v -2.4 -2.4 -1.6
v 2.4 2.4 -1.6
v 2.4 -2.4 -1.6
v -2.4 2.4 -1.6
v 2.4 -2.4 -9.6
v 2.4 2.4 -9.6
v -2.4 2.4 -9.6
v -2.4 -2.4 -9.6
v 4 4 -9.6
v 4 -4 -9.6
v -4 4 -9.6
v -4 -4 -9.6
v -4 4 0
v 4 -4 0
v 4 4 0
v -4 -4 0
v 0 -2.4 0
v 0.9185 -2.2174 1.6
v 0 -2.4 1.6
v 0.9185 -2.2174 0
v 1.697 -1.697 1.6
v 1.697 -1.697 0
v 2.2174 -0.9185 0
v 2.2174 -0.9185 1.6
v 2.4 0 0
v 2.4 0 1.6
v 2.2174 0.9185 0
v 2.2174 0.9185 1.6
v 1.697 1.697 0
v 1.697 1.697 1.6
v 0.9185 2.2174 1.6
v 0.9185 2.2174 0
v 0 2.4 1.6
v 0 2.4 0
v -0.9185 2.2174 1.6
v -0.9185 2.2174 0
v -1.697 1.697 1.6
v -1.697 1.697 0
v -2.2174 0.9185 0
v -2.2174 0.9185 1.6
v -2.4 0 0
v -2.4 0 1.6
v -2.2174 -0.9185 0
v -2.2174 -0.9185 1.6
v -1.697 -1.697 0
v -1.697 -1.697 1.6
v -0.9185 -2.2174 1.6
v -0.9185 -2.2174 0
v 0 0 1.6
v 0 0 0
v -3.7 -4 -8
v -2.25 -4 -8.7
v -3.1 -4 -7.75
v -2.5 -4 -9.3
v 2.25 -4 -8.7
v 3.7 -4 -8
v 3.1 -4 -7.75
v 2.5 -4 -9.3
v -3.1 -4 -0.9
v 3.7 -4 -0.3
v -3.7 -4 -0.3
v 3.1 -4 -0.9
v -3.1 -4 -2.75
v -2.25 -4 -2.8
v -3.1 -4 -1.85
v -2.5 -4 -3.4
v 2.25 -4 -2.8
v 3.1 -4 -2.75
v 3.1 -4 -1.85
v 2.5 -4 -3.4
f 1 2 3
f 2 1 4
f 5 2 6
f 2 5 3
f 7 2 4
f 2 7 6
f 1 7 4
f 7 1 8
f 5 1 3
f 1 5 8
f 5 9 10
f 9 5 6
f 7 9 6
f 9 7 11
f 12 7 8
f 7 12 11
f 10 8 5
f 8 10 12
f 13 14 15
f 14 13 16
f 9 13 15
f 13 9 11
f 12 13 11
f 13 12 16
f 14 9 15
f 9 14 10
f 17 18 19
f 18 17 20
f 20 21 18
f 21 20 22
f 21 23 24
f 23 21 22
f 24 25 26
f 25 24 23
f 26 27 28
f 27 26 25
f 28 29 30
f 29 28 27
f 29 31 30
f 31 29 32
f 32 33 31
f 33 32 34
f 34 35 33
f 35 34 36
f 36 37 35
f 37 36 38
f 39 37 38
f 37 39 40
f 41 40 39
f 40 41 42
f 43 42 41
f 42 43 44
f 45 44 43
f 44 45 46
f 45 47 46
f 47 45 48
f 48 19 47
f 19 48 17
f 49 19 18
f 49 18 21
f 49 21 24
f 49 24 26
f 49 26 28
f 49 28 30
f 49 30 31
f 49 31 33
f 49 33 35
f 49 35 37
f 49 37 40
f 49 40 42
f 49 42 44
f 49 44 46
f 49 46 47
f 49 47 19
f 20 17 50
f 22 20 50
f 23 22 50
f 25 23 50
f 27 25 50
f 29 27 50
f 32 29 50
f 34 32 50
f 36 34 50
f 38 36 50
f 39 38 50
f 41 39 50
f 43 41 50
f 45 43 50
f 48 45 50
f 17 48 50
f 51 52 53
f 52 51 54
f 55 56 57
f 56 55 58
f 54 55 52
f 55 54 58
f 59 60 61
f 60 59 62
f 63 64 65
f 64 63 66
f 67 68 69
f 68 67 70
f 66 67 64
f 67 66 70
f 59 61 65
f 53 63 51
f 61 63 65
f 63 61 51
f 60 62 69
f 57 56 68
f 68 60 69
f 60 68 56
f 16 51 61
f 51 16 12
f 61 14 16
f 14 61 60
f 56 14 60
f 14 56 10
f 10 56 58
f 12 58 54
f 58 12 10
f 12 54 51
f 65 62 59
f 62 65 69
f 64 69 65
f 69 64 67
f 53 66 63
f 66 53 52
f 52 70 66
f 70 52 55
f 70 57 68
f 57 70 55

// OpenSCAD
// file: ../p/4-4edge.scad
use <../lib.scad>
function ldraw_lib__4_4edge() = [
// 0 Circle 1.0
// 0 Name: 4-4edge.dat
// 0 Author: James Jessiman
// 0 !LDRAW_ORG Primitive UPDATE 2017-01
// 0 !LICENSE Licensed under CC BY 2.0 and CC BY 4.0 : see CAreadme.txt
// 
// 0 BFC CERTIFY CCW
  [0,"BFC","CERTIFY"],
  [0,"BFC","CCW"],
// 
// 0 !HISTORY 1998-12-15 [PTadmin] Official Update 1998-10
// 0 !HISTORY 2005-12-28 [PTadmin] Official Update 2005-01
// 0 !HISTORY 2007-06-24 [PTadmin] Header formatted for Contributor Agreement
// 0 !HISTORY 2008-07-01 [PTadmin] Official Update 2008-01
// 0 !HISTORY 2017-01-15 [Steffen] BFCed
// 0 !HISTORY 2017-12-30 [PTadmin] Official Update 2017-01
// 
// 
// 2 24 1 0 0 0.9239 0 0.3827
  [2,24,1,0,0,0.9239,0,0.3827],
// 2 24 0.9239 0 0.3827 0.7071 0 0.7071
  [2,24,0.9239,0,0.3827,0.7071,0,0.7071],
// 2 24 0.7071 0 0.7071 0.3827 0 0.9239
  [2,24,0.7071,0,0.7071,0.3827,0,0.9239],
// 2 24 0.3827 0 0.9239 0 0 1
  [2,24,0.3827,0,0.9239,0,0,1],
// 2 24 0 0 1 -0.3827 0 0.9239
  [2,24,0,0,1,-0.3827,0,0.9239],
// 2 24 -0.3827 0 0.9239 -0.7071 0 0.7071
  [2,24,-0.3827,0,0.9239,-0.7071,0,0.7071],
// 2 24 -0.7071 0 0.7071 -0.9239 0 0.3827
  [2,24,-0.7071,0,0.7071,-0.9239,0,0.3827],
// 2 24 -0.9239 0 0.3827 -1 0 -0
  [2,24,-0.9239,0,0.3827,-1,0,-0],
// 2 24 -1 0 -0 -0.9239 0 -0.3827
  [2,24,-1,0,-0,-0.9239,0,-0.3827],
// 2 24 -0.9239 0 -0.3827 -0.7071 0 -0.7071
  [2,24,-0.9239,0,-0.3827,-0.7071,0,-0.7071],
// 2 24 -0.7071 0 -0.7071 -0.3827 0 -0.9239
  [2,24,-0.7071,0,-0.7071,-0.3827,0,-0.9239],
// 2 24 -0.3827 0 -0.9239 0 0 -1
  [2,24,-0.3827,0,-0.9239,0,0,-1],
// 2 24 0 0 -1 0.3827 0 -0.9239
  [2,24,0,0,-1,0.3827,0,-0.9239],
// 2 24 0.3827 0 -0.9239 0.7071 0 -0.7071
  [2,24,0.3827,0,-0.9239,0.7071,0,-0.7071],
// 2 24 0.7071 0 -0.7071 0.9239 0 -0.3827
  [2,24,0.7071,0,-0.7071,0.9239,0,-0.3827],
// 2 24 0.9239 0 -0.3827 1 0 0
  [2,24,0.9239,0,-0.3827,1,0,0],
];
module ldraw_lib__4_4edge(step=0, col=false, unit=2/5, alt=false, line=0.2, solid=!$preview)
    makepoly(ldraw_lib__4_4edge(), step=step, col=col, unit=unit, alt=alt, line=line, solid=solid);
ldraw_lib__4_4edge(line=0.2);
// file: ../p/4-4disc.scad
use <../lib.scad>
function ldraw_lib__4_4disc() = [
// 0 Disc 1.0
// 0 Name: 4-4disc.dat
// 0 Author: James Jessiman
// 0 !LDRAW_ORG Primitive UPDATE 2002-02
// 0 !LICENSE Licensed under CC BY 2.0 and CC BY 4.0 : see CAreadme.txt
// 
// 0 BFC CERTIFY CCW
  [0,"BFC","CERTIFY"],
  [0,"BFC","CCW"],
// 
// 0 !HISTORY 1998-12-15 [PTadmin] Official Update 1998-10
// 0 !HISTORY 2002-03-23 [sbliss] Added BFC statement
// 0 !HISTORY 2002-04-25 [PTadmin] Official Update 2002-02
// 0 !HISTORY 2007-06-24 [PTadmin] Header formatted for Contributor Agreement
// 0 !HISTORY 2008-07-01 [PTadmin] Official Update 2008-01
// 
// 
// 3 16 0 0 0 1 0 0 0.9239 0 0.3827
  [3,16,0,0,0,1,0,0,0.9239,0,0.3827],
// 3 16 0 0 0 0.9239 0 0.3827 0.7071 0 0.7071
  [3,16,0,0,0,0.9239,0,0.3827,0.7071,0,0.7071],
// 3 16 0 0 0 0.7071 0 0.7071 0.3827 0 0.9239
  [3,16,0,0,0,0.7071,0,0.7071,0.3827,0,0.9239],
// 3 16 0 0 0 0.3827 0 0.9239 0 0 1
  [3,16,0,0,0,0.3827,0,0.9239,0,0,1],
// 3 16 0 0 0 0 0 1 -0.3827 0 0.9239
  [3,16,0,0,0,0,0,1,-0.3827,0,0.9239],
// 3 16 0 0 0 -0.3827 0 0.9239 -0.7071 0 0.7071
  [3,16,0,0,0,-0.3827,0,0.9239,-0.7071,0,0.7071],
// 3 16 0 0 0 -0.7071 0 0.7071 -0.9239 0 0.3827
  [3,16,0,0,0,-0.7071,0,0.7071,-0.9239,0,0.3827],
// 3 16 0 0 0 -0.9239 0 0.3827 -1 0 -0
  [3,16,0,0,0,-0.9239,0,0.3827,-1,0,-0],
// 3 16 0 0 0 -1 0 -0 -0.9239 0 -0.3827
  [3,16,0,0,0,-1,0,-0,-0.9239,0,-0.3827],
// 3 16 0 0 0 -0.9239 0 -0.3827 -0.7071 0 -0.7071
  [3,16,0,0,0,-0.9239,0,-0.3827,-0.7071,0,-0.7071],
// 3 16 0 0 0 -0.7071 0 -0.7071 -0.3827 0 -0.9239
  [3,16,0,0,0,-0.7071,0,-0.7071,-0.3827,0,-0.9239],
// 3 16 0 0 0 -0.3827 0 -0.9239 0 0 -1
  [3,16,0,0,0,-0.3827,0,-0.9239,0,0,-1],
// 3 16 0 0 0 0 0 -1 0.3827 0 -0.9239
  [3,16,0,0,0,0,0,-1,0.3827,0,-0.9239],
// 3 16 0 0 0 0.3827 0 -0.9239 0.7071 0 -0.7071
  [3,16,0,0,0,0.3827,0,-0.9239,0.7071,0,-0.7071],
// 3 16 0 0 0 0.7071 0 -0.7071 0.9239 0 -0.3827
  [3,16,0,0,0,0.7071,0,-0.7071,0.9239,0,-0.3827],
// 3 16 0 0 0 0.9239 0 -0.3827 1 0 0
  [3,16,0,0,0,0.9239,0,-0.3827,1,0,0],
// 0
];
module ldraw_lib__4_4disc(step=0, col=false, unit=2/5, alt=false, line=0.2, solid=!$preview)
    makepoly(ldraw_lib__4_4disc(), step=step, col=col, unit=unit, alt=alt, line=line, solid=solid);
ldraw_lib__4_4disc(line=0.2);
// file: ../p/4-4cyli.scad
use <../lib.scad>
$fa=1; $fs=0.2;
function ldraw_lib__4_4cyli(realsolid=false) = [
// 0 Cylinder 1.0
// 0 Name: 4-4cyli.dat
// 0 Author: James Jessiman
// 0 !LDRAW_ORG Primitive UPDATE 2005-01
// 0 !LICENSE Licensed under CC BY 2.0 and CC BY 4.0 : see CAreadme.txt
// 
// 0 BFC CERTIFY CCW
  [0,"BFC","CERTIFY"],
  [0,"BFC","CCW"],
// 
// 0 !HISTORY 1998-12-15 [PTadmin] Official Update 1998-10
// 0 !HISTORY 2002-03-23 [sbliss] Added BFC statement; merged headers from files in distributions LDraw 0.27 and Complete.
// 0 !HISTORY 2002-04-25 [PTadmin] Official Update 2002-02
// 0 !HISTORY 2004-12-14 [guyvivan] BFC CCW
// 0 !HISTORY 2005-12-28 [PTadmin] Official Update 2005-01
// 0 !HISTORY 2007-06-24 [PTadmin] Header formatted for Contributor Agreement
// 0 !HISTORY 2008-07-01 [PTadmin] Official Update 2008-01
// 
// 
// 4 16 1 1 0 0.9239 1 0.3827 0.9239 0 0.3827 1 0 0
  [4,16,1,1,0,0.9239,1,0.3827,0.9239,0,0.3827,1,0,0],
// 5 24 1 0 0 1 1 0 0.9239 0 0.3827 0.9239 0 -0.3827
  [5,24,1,0,0,1,1,0,0.9239,0,0.3827,0.9239,0,-0.3827],
// 4 16 0.9239 1 0.3827 0.7071 1 0.7071 0.7071 0 0.7071 0.9239 0 0.3827
  [4,16,0.9239,1,0.3827,0.7071,1,0.7071,0.7071,0,0.7071,0.9239,0,0.3827],
// 5 24 0.9239 0 0.3827 0.9239 1 0.3827 0.7071 0 0.7071 1 0 0
  [5,24,0.9239,0,0.3827,0.9239,1,0.3827,0.7071,0,0.7071,1,0,0],
// 4 16 0.7071 1 0.7071 0.3827 1 0.9239 0.3827 0 0.9239 0.7071 0 0.7071
  [4,16,0.7071,1,0.7071,0.3827,1,0.9239,0.3827,0,0.9239,0.7071,0,0.7071],
// 5 24 0.7071 0 0.7071 0.7071 1 0.7071 0.3827 0 0.9239 0.9239 0 0.3827
  [5,24,0.7071,0,0.7071,0.7071,1,0.7071,0.3827,0,0.9239,0.9239,0,0.3827],
// 4 16 0.3827 1 0.9239 0 1 1 0 0 1 0.3827 0 0.9239
  [4,16,0.3827,1,0.9239,0,1,1,0,0,1,0.3827,0,0.9239],
// 5 24 0.3827 0 0.9239 0.3827 1 0.9239 0 0 1 0.7071 0 0.7071
  [5,24,0.3827,0,0.9239,0.3827,1,0.9239,0,0,1,0.7071,0,0.7071],
// 4 16 0 1 1 -0.3827 1 0.9239 -0.3827 0 0.9239 0 0 1
  [4,16,0,1,1,-0.3827,1,0.9239,-0.3827,0,0.9239,0,0,1],
// 5 24 0 0 1 0 1 1 -0.3827 0 0.9239 0.3827 0 0.9239
  [5,24,0,0,1,0,1,1,-0.3827,0,0.9239,0.3827,0,0.9239],
// 4 16 -0.3827 1 0.9239 -0.7071 1 0.7071 -0.7071 0 0.7071 -0.3827 0 0.9239
  [4,16,-0.3827,1,0.9239,-0.7071,1,0.7071,-0.7071,0,0.7071,-0.3827,0,0.9239],
// 5 24 -0.3827 0 0.9239 -0.3827 1 0.9239 -0.7071 0 0.7071 0 0 1
  [5,24,-0.3827,0,0.9239,-0.3827,1,0.9239,-0.7071,0,0.7071,0,0,1],
// 4 16 -0.7071 1 0.7071 -0.9239 1 0.3827 -0.9239 0 0.3827 -0.7071 0 0.7071
  [4,16,-0.7071,1,0.7071,-0.9239,1,0.3827,-0.9239,0,0.3827,-0.7071,0,0.7071],
// 5 24 -0.7071 0 0.7071 -0.7071 1 0.7071 -0.9239 0 0.3827 -0.3827 0 0.9239
  [5,24,-0.7071,0,0.7071,-0.7071,1,0.7071,-0.9239,0,0.3827,-0.3827,0,0.9239],
// 4 16 -0.9239 1 0.3827 -1 1 0 -1 0 0 -0.9239 0 0.3827
  [4,16,-0.9239,1,0.3827,-1,1,0,-1,0,0,-0.9239,0,0.3827],
// 5 24 -0.9239 0 0.3827 -0.9239 1 0.3827 -1 0 0 -0.7071 0 0.7071
  [5,24,-0.9239,0,0.3827,-0.9239,1,0.3827,-1,0,0,-0.7071,0,0.7071],
// 4 16 -1 1 0 -0.9239 1 -0.3827 -0.9239 0 -0.3827 -1 0 0
  [4,16,-1,1,0,-0.9239,1,-0.3827,-0.9239,0,-0.3827,-1,0,0],
// 5 24 -1 0 0 -1 1 0 -0.9239 0 -0.3827 -0.9239 0 0.3827
  [5,24,-1,0,0,-1,1,0,-0.9239,0,-0.3827,-0.9239,0,0.3827],
// 4 16 -0.9239 1 -0.3827 -0.7071 1 -0.7071 -0.7071 0 -0.7071 -0.9239 0 -0.3827
  [4,16,-0.9239,1,-0.3827,-0.7071,1,-0.7071,-0.7071,0,-0.7071,-0.9239,0,-0.3827],
// 5 24 -0.9239 0 -0.3827 -0.9239 1 -0.3827 -0.7071 0 -0.7071 -1 0 0
  [5,24,-0.9239,0,-0.3827,-0.9239,1,-0.3827,-0.7071,0,-0.7071,-1,0,0],
// 4 16 -0.7071 1 -0.7071 -0.3827 1 -0.9239 -0.3827 0 -0.9239 -0.7071 0 -0.7071
  [4,16,-0.7071,1,-0.7071,-0.3827,1,-0.9239,-0.3827,0,-0.9239,-0.7071,0,-0.7071],
// 5 24 -0.7071 0 -0.7071 -0.7071 1 -0.7071 -0.3827 0 -0.9239 -0.9239 0 -0.3827
  [5,24,-0.7071,0,-0.7071,-0.7071,1,-0.7071,-0.3827,0,-0.9239,-0.9239,0,-0.3827],
// 4 16 -0.3827 1 -0.9239 0 1 -1 0 0 -1 -0.3827 0 -0.9239
  [4,16,-0.3827,1,-0.9239,0,1,-1,0,0,-1,-0.3827,0,-0.9239],
// 5 24 -0.3827 0 -0.9239 -0.3827 1 -0.9239 0 0 -1 -0.7071 0 -0.7071
  [5,24,-0.3827,0,-0.9239,-0.3827,1,-0.9239,0,0,-1,-0.7071,0,-0.7071],
// 4 16 0 1 -1 0.3827 1 -0.9239 0.3827 0 -0.9239 0 0 -1
  [4,16,0,1,-1,0.3827,1,-0.9239,0.3827,0,-0.9239,0,0,-1],
// 5 24 0 0 -1 0 1 -1 0.3827 0 -0.9239 -0.3827 0 -0.9239
  [5,24,0,0,-1,0,1,-1,0.3827,0,-0.9239,-0.3827,0,-0.9239],
// 4 16 0.3827 1 -0.9239 0.7071 1 -0.7071 0.7071 0 -0.7071 0.3827 0 -0.9239
  [4,16,0.3827,1,-0.9239,0.7071,1,-0.7071,0.7071,0,-0.7071,0.3827,0,-0.9239],
// 5 24 0.3827 0 -0.9239 0.3827 1 -0.9239 0.7071 0 -0.7071 0 0 -1
  [5,24,0.3827,0,-0.9239,0.3827,1,-0.9239,0.7071,0,-0.7071,0,0,-1],
// 4 16 0.7071 1 -0.7071 0.9239 1 -0.3827 0.9239 0 -0.3827 0.7071 0 -0.7071
  [4,16,0.7071,1,-0.7071,0.9239,1,-0.3827,0.9239,0,-0.3827,0.7071,0,-0.7071],
// 5 24 0.7071 0 -0.7071 0.7071 1 -0.7071 0.9239 0 -0.3827 0.3827 0 -0.9239
  [5,24,0.7071,0,-0.7071,0.7071,1,-0.7071,0.9239,0,-0.3827,0.3827,0,-0.9239],
// 4 16 0.9239 1 -0.3827 1 1 0 1 0 0 0.9239 0 -0.3827
  [4,16,0.9239,1,-0.3827,1,1,0,1,0,0,0.9239,0,-0.3827],
// 5 24 0.9239 0 -0.3827 0.9239 1 -0.3827 1 0 0 0.7071 0 -0.7071
  [5,24,0.9239,0,-0.3827,0.9239,1,-0.3827,1,0,0,0.7071,0,-0.7071],
// 0
];
module ldraw_lib__4_4cyli(step=0, col=false, unit=2/5, alt=false, line=0.2, solid=!$preview)
    makepoly(ldraw_lib__4_4cyli(solid), step=step, col=col, unit=unit, alt=alt, line=line, solid=solid);
ldraw_lib__4_4cyli(line=0.2);
// file: ../p/stud.scad
use <../lib.scad>
use <4-4cyli.scad>
use <4-4disc.scad>
use <4-4edge.scad>
function ldraw_lib__stud() = [
// 0 Stud
// 0 Name: stud.dat
// 0 Author: James Jessiman
// 0 !LDRAW_ORG Primitive UPDATE 2012-01
// 0 !LICENSE Licensed under CC BY 4.0 : see CAreadme.txt
// 
// 0 BFC CERTIFY CCW
  [0,"BFC","CERTIFY"],
  [0,"BFC","CCW"],
// 
// 0 !HISTORY 2002-04-04 [sbliss] Modified for BFC compliance
// 0 !HISTORY 2002-04-25 [PTadmin] Official Update 2002-02
// 0 !HISTORY 2007-06-24 [PTadmin] Header formatted for Contributor Agreement
// 0 !HISTORY 2008-07-01 [PTadmin] Official Update 2008-01
// 0 !HISTORY 2012-02-16 [Philo] Changed to CCW
// 0 !HISTORY 2012-03-30 [PTadmin] Official Update 2012-01
// 
// 
// 1 16 0 0 0 6 0 0 0 1 0 0 0 6 4-4edge.dat
  [1,16,0,0,0,6,0,0,0,1,0,0,0,6, ldraw_lib__4_4edge()],
// 1 16 0 -4 0 6 0 0 0 1 0 0 0 6 4-4edge.dat
  [1,16,0,-4,0,6,0,0,0,1,0,0,0,6, ldraw_lib__4_4edge()],
// 1 16 0 0 0 6 0 0 0 -4 0 0 0 6 4-4cyli.dat
  [1,16,0,0,0,6,0,0,0,-4,0,0,0,6, ldraw_lib__4_4cyli()],
// 1 16 0 -4 0 6 0 0 0 1 0 0 0 6 4-4disc.dat
  [1,16,0,-4,0,6,0,0,0,1,0,0,0,6, ldraw_lib__4_4disc()],
  [-1,16,0,0,0,6,0,0,0,-1,0,0,0,6, ldraw_lib__4_4disc()],
];
module ldraw_lib__stud(step=0, col=false, unit=2/5, alt=false, line=0.2, solid=!$preview)
    makepoly(ldraw_lib__stud(), step=step, col=col, unit=unit, alt=alt, line=line, solid=solid);
ldraw_lib__stud(line=0.2);
// file: ../p/box5.scad
use <../lib.scad>
function ldraw_lib__box5() = [
// 0 Box with 5 Faces and All Edges
// 0 Name: box5.dat
// 0 Author: James Jessiman
// 0 !LDRAW_ORG Primitive UPDATE 2012-01
// 0 !LICENSE Licensed under CC BY 2.0 and CC BY 4.0 : see CAreadme.txt
// 
// 0 BFC CERTIFY CCW
  [0,"BFC","CERTIFY"],
  [0,"BFC","CCW"],
// 
// 0 !HISTORY 2002-04-03 [sbliss] Modified for BFC compliance
// 0 !HISTORY 2002-04-25 [PTadmin] Official Update 2002-02
// 0 !HISTORY 2007-06-24 [PTadmin] Header formatted for Contributor Agreement
// 0 !HISTORY 2008-07-01 [PTadmin] Official Update 2008-01
// 0 !HISTORY 2012-02-16 [Philo] Changed to CCW
// 0 !HISTORY 2012-03-30 [PTadmin] Official Update 2012-01
// 
// 
// 2 24 1 1 1 -1 1 1
  [2,24,1,1,1,-1,1,1],
// 2 24 -1 1 1 -1 1 -1
  [2,24,-1,1,1,-1,1,-1],
// 2 24 -1 1 -1 1 1 -1
  [2,24,-1,1,-1,1,1,-1],
// 2 24 1 1 -1 1 1 1
  [2,24,1,1,-1,1,1,1],
// 2 24 1 0 1 -1 0 1
  [2,24,1,0,1,-1,0,1],
// 2 24 -1 0 1 -1 0 -1
  [2,24,-1,0,1,-1,0,-1],
// 2 24 -1 0 -1 1 0 -1
  [2,24,-1,0,-1,1,0,-1],
// 2 24 1 0 -1 1 0 1
  [2,24,1,0,-1,1,0,1],
// 2 24 1 0 1 1 1 1
  [2,24,1,0,1,1,1,1],
// 2 24 -1 0 1 -1 1 1
  [2,24,-1,0,1,-1,1,1],
// 2 24 1 0 -1 1 1 -1
  [2,24,1,0,-1,1,1,-1],
// 2 24 -1 0 -1 -1 1 -1
  [2,24,-1,0,-1,-1,1,-1],
// 4 16 -1 1 1 1 1 1 1 1 -1 -1 1 -1
  [4,16,-1,1,1,1,1,1,1,1,-1,-1,1,-1],
// 4 16 -1 1 1 -1 0 1 1 0 1 1 1 1
  [4,16,-1,1,1,-1,0,1,1,0,1,1,1,1],
// 4 16 -1 1 -1 -1 0 -1 -1 0 1 -1 1 1
  [4,16,-1,1,-1,-1,0,-1,-1,0,1,-1,1,1],
// 4 16 1 1 -1 1 0 -1 -1 0 -1 -1 1 -1
  [4,16,1,1,-1,1,0,-1,-1,0,-1,-1,1,-1],
// 4 16 1 1 1 1 0 1 1 0 -1 1 1 -1
  [4,16,1,1,1,1,0,1,1,0,-1,1,1,-1],
];
makepoly(ldraw_lib__box5(), line=0.2);
// file: ../p/box4t.scad
use <../lib.scad>
function ldraw_lib__box4t() = [
// 0 Box with 4 Adjacent Faces and All Edges
// 0 Name: box4t.dat
// 0 Author: Tore Eriksson [Tore_Eriksson]
// 0 !LDRAW_ORG Primitive UPDATE 2003-02
// 0 !LICENSE Licensed under CC BY 2.0 and CC BY 4.0 : see CAreadme.txt
// 
// 0 BFC CERTIFY CCW
  [0,"BFC","CERTIFY"],
  [0,"BFC","CCW"],
// 
// 0 !HISTORY 1997-09-29 [PTadmin] Official Update 1997-15
// 0 !HISTORY 2002-08-31 [izanette] Modified with WINDZ for BFC compliance
// 0 !HISTORY 2003-08-01 [PTadmin] Official Update 2003-02
// 0 !HISTORY 2007-06-24 [PTadmin] Header formatted for Contributor Agreement
// 0 !HISTORY 2008-07-01 [PTadmin] Official Update 2008-01
// 
// 
// 2 24 1 1 1 -1 1 1
  [2,24,1,1,1,-1,1,1],
// 2 24 -1 1 1 -1 1 -1
  [2,24,-1,1,1,-1,1,-1],
// 2 24 -1 1 -1 1 1 -1
  [2,24,-1,1,-1,1,1,-1],
// 2 24 1 1 -1 1 1 1
  [2,24,1,1,-1,1,1,1],
// 2 24 1 0 1 -1 0 1
  [2,24,1,0,1,-1,0,1],
// 2 24 -1 0 1 -1 0 -1
  [2,24,-1,0,1,-1,0,-1],
// 2 24 -1 0 -1 1 0 -1
  [2,24,-1,0,-1,1,0,-1],
// 2 24 1 0 -1 1 0 1
  [2,24,1,0,-1,1,0,1],
// 2 24 1 0 1 1 1 1
  [2,24,1,0,1,1,1,1],
// 2 24 -1 0 1 -1 1 1
  [2,24,-1,0,1,-1,1,1],
// 2 24 1 0 -1 1 1 -1
  [2,24,1,0,-1,1,1,-1],
// 2 24 -1 0 -1 -1 1 -1
  [2,24,-1,0,-1,-1,1,-1],
// 4 16 1 1 1 1 1 -1 -1 1 -1 -1 1 1
  [4,16,1,1,1,1,1,-1,-1,1,-1,-1,1,1],
// 4 16 1 1 1 -1 1 1 -1 0 1 1 0 1
  [4,16,1,1,1,-1,1,1,-1,0,1,1,0,1],
// 4 16 -1 1 1 -1 1 -1 -1 0 -1 -1 0 1
  [4,16,-1,1,1,-1,1,-1,-1,0,-1,-1,0,1],
// 0 4 16 -1 1 -1 -1 0 -1 1 0 -1 1 1 -1
// 4 16 1 1 -1 1 1 1 1 0 1 1 0 -1
  [4,16,1,1,-1,1,1,1,1,0,1,1,0,-1],
// 0
];
makepoly(ldraw_lib__box4t(), line=0.2);
// file: s/3005s01.scad
use <../../lib.scad>
use <../../p/box4t.scad>
use <../../p/box5.scad>
use <../../p/stud.scad>
function ldraw_lib__s__3005s01() = [
// 0 ~Brick  1 x  1 without Front Face
// 0 Name: s\3005s01.dat
// 0 Author: John Riley [jriley]
// 0 !LDRAW_ORG Subpart UPDATE 2004-01
// 0 !LICENSE Licensed under CC BY 2.0 and CC BY 4.0 : see CAreadme.txt
// 
// 0 BFC CERTIFY CCW
  [0,"BFC","CERTIFY"],
  [0,"BFC","CCW"],
// 
// 0 !HISTORY 2003-09-07 [jriley] BFCed & Subfiled
// 0 !HISTORY 2004-03-02 [PTadmin] Official Update 2004-01
// 0 !HISTORY 2007-08-29 [PTadmin] Header formatted for Contributor Agreement
// 0 !HISTORY 2008-07-01 [PTadmin] Official Update 2008-01
// 
// 
// 0 BFC INVERTNEXT
  [0,"BFC","INVERTNEXT"],
// 1 16 0 24 0 0 0 6 0 -20 0 -6 0 0 box5.dat
  [1,16,0,24,0,0,0,6,0,-20,0,-6,0,0, ldraw_lib__box5()],
// 4 16 10 24 -10 6 24 -6 6 24 6 10 24 10
  [4,16,10,24,-10,6,24,-6,6,24,6,10,24,10],
// 4 16 10 24 10 6 24 6 -6 24 6 -10 24 10
  [4,16,10,24,10,6,24,6,-6,24,6,-10,24,10],
// 4 16 -10 24 10 -6 24 6 -6 24 -6 -10 24 -10
  [4,16,-10,24,10,-6,24,6,-6,24,-6,-10,24,-10],
// 4 16 -10 24 -10 -6 24 -6 6 24 -6 10 24 -10
  [4,16,-10,24,-10,-6,24,-6,6,24,-6,10,24,-10],
// 1 16 0 24 0 10 0 0 0 -24 0 0 0 10 box4t.dat
  [1,16,0,24,0,10,0,0,0,-24,0,0,0,10, ldraw_lib__box4t()],
// 1 16 0 0 0 0 0 1 0 1 0 -1 0 0 stud.dat
  [1,16,0,0,0,0,0,1,0,1,0,-1,0,0, ldraw_lib__stud()],
// 0
];
module ldraw_lib__s__3005s01(step=0, col=false, unit=2/5, alt=false, line=0.2, solid=!$preview)
    makepoly(ldraw_lib__s__3005s01(), step=step, col=col, unit=unit, alt=alt, line=line, solid=solid);
ldraw_lib__s__3005s01(line=0.2);
// main file
use <../lib.scad>
use <s/3005s01.scad>
function ldraw_lib__3005pz1() = [
// 0 Brick  1 x  1 with Pocket Pattern
// 0 Name: 3005pz1.dat
// 0 Author: Vincent Messenet [Cheenzo]
// 0 !LDRAW_ORG Part UPDATE 2020-02
// 0 !LICENSE Licensed under CC BY 4.0 : see CAreadme.txt
// 
// 0 BFC CERTIFY CCW
  [0,"BFC","CERTIFY"],
  [0,"BFC","CCW"],
// 
// 0 !KEYWORDS Brickheadz, BrickLink 3005pb030, Jurassic world, Owen
// 0 !KEYWORDS Rebrickable 3005pr0016, Set 41614
// 
// 0 !HISTORY 2020-09-05 [PTadmin] Official Update 2020-02
// 
// 
// 1 16 0 0 0 1 0 0 0 1 0 0 0 1 s\3005s01.dat
  [1,16,0,0,0,1,0,0,0,1,0,0,0,1, ldraw_lib__s__3005s01()],
// 
// 4 0 -6.25 23.25 -10 -5.625 21.75 -10 -7.75 19.375 -10 -9.25 20 -10
  [4,0,-6.25,23.25,-10,-5.625,21.75,-10,-7.75,19.375,-10,-9.25,20,-10],
// 4 0 7.75 19.375 -10 5.625 21.75 -10 6.25 23.25 -10 9.25 20 -10
  [4,0,7.75,19.375,-10,5.625,21.75,-10,6.25,23.25,-10,9.25,20,-10],
// 4 0 6.25 23.25 -10 5.625 21.75 -10 -5.625 21.75 -10 -6.25 23.25 -10
  [4,0,6.25,23.25,-10,5.625,21.75,-10,-5.625,21.75,-10,-6.25,23.25,-10],
// 4 0 -9.25 .75 -10 -7.75 2.25 -10 7.75 2.25 -10 9.25 .75 -10
  [4,0,-9.25,.75,-10,-7.75,2.25,-10,7.75,2.25,-10,9.25,.75,-10],
// 4 0 -6.25 8.5 -10 -5.625 7 -10 -7.75 4.625 -10 -7.75 6.875 -10
  [4,0,-6.25,8.5,-10,-5.625,7,-10,-7.75,4.625,-10,-7.75,6.875,-10],
// 4 0 7.75 4.625 -10 5.625 7 -10 6.25 8.5 -10 7.75 6.875 -10
  [4,0,7.75,4.625,-10,5.625,7,-10,6.25,8.5,-10,7.75,6.875,-10],
// 4 0 6.25 8.5 -10 5.625 7 -10 -5.625 7 -10 -6.25 8.5 -10
  [4,0,6.25,8.5,-10,5.625,7,-10,-5.625,7,-10,-6.25,8.5,-10],
// 3 0 -7.75 2.25 -10 -9.25 .75 -10 -7.75 4.625 -10
  [3,0,-7.75,2.25,-10,-9.25,.75,-10,-7.75,4.625,-10],
// 3 0 -7.75 19.375 -10 -7.75 6.875 -10 -9.25 20 -10
  [3,0,-7.75,19.375,-10,-7.75,6.875,-10,-9.25,20,-10],
// 4 0 -7.75 6.875 -10 -7.75 4.625 -10 -9.25 .75 -10 -9.25 20 -10
  [4,0,-7.75,6.875,-10,-7.75,4.625,-10,-9.25,.75,-10,-9.25,20,-10],
// 3 0 9.25 .75 -10 7.75 2.25 -10 7.75 4.625 -10
  [3,0,9.25,.75,-10,7.75,2.25,-10,7.75,4.625,-10],
// 3 0 7.75 19.375 -10 9.25 20 -10 7.75 6.875 -10
  [3,0,7.75,19.375,-10,9.25,20,-10,7.75,6.875,-10],
// 4 0 9.25 .75 -10 7.75 4.625 -10 7.75 6.875 -10 9.25 20 -10
  [4,0,9.25,.75,-10,7.75,4.625,-10,7.75,6.875,-10,9.25,20,-10],
// 4 16 -9.25 20 -10 -9.25 .75 -10 -10 0 -10 -10 24 -10
  [4,16,-9.25,20,-10,-9.25,.75,-10,-10,0,-10,-10,24,-10],
// 4 16 -10 0 -10 -9.25 .75 -10 9.25 .75 -10 10 0 -10
  [4,16,-10,0,-10,-9.25,.75,-10,9.25,.75,-10,10,0,-10],
// 4 16 10 0 -10 9.25 .75 -10 9.25 20 -10 10 24 -10
  [4,16,10,0,-10,9.25,.75,-10,9.25,20,-10,10,24,-10],
// 3 16 10 24 -10 9.25 20 -10 6.25 23.25 -10
  [3,16,10,24,-10,9.25,20,-10,6.25,23.25,-10],
// 4 16 10 24 -10 6.25 23.25 -10 -6.25 23.25 -10 -10 24 -10
  [4,16,10,24,-10,6.25,23.25,-10,-6.25,23.25,-10,-10,24,-10],
// 3 16 -10 24 -10 -6.25 23.25 -10 -9.25 20 -10
  [3,16,-10,24,-10,-6.25,23.25,-10,-9.25,20,-10],
// 4 16 -7.75 2.25 -10 -7.75 4.625 -10 7.75 4.625 -10 7.75 2.25 -10
  [4,16,-7.75,2.25,-10,-7.75,4.625,-10,7.75,4.625,-10,7.75,2.25,-10],
// 4 16 5.625 7 -10 7.75 4.625 -10 -7.75 4.625 -10 -5.625 7 -10
  [4,16,5.625,7,-10,7.75,4.625,-10,-7.75,4.625,-10,-5.625,7,-10],
// 4 16 -5.625 21.75 -10 -6.25 8.5 -10 -7.75 6.875 -10 -7.75 19.375 -10
  [4,16,-5.625,21.75,-10,-6.25,8.5,-10,-7.75,6.875,-10,-7.75,19.375,-10],
// 4 16 -6.25 8.5 -10 -5.625 21.75 -10 5.625 21.75 -10 6.25 8.5 -10
  [4,16,-6.25,8.5,-10,-5.625,21.75,-10,5.625,21.75,-10,6.25,8.5,-10],
// 4 16 7.75 6.875 -10 6.25 8.5 -10 5.625 21.75 -10 7.75 19.375 -10
  [4,16,7.75,6.875,-10,6.25,8.5,-10,5.625,21.75,-10,7.75,19.375,-10],
];
module ldraw_lib__3005pz1(step=0, col=false, unit=2/5, alt=false, line=0.2, solid=!$preview)
    makepoly(ldraw_lib__3005pz1(), step=step, col=col, unit=unit, alt=alt, line=line, solid=solid);
ldraw_lib__3005pz1(line=0.2);
